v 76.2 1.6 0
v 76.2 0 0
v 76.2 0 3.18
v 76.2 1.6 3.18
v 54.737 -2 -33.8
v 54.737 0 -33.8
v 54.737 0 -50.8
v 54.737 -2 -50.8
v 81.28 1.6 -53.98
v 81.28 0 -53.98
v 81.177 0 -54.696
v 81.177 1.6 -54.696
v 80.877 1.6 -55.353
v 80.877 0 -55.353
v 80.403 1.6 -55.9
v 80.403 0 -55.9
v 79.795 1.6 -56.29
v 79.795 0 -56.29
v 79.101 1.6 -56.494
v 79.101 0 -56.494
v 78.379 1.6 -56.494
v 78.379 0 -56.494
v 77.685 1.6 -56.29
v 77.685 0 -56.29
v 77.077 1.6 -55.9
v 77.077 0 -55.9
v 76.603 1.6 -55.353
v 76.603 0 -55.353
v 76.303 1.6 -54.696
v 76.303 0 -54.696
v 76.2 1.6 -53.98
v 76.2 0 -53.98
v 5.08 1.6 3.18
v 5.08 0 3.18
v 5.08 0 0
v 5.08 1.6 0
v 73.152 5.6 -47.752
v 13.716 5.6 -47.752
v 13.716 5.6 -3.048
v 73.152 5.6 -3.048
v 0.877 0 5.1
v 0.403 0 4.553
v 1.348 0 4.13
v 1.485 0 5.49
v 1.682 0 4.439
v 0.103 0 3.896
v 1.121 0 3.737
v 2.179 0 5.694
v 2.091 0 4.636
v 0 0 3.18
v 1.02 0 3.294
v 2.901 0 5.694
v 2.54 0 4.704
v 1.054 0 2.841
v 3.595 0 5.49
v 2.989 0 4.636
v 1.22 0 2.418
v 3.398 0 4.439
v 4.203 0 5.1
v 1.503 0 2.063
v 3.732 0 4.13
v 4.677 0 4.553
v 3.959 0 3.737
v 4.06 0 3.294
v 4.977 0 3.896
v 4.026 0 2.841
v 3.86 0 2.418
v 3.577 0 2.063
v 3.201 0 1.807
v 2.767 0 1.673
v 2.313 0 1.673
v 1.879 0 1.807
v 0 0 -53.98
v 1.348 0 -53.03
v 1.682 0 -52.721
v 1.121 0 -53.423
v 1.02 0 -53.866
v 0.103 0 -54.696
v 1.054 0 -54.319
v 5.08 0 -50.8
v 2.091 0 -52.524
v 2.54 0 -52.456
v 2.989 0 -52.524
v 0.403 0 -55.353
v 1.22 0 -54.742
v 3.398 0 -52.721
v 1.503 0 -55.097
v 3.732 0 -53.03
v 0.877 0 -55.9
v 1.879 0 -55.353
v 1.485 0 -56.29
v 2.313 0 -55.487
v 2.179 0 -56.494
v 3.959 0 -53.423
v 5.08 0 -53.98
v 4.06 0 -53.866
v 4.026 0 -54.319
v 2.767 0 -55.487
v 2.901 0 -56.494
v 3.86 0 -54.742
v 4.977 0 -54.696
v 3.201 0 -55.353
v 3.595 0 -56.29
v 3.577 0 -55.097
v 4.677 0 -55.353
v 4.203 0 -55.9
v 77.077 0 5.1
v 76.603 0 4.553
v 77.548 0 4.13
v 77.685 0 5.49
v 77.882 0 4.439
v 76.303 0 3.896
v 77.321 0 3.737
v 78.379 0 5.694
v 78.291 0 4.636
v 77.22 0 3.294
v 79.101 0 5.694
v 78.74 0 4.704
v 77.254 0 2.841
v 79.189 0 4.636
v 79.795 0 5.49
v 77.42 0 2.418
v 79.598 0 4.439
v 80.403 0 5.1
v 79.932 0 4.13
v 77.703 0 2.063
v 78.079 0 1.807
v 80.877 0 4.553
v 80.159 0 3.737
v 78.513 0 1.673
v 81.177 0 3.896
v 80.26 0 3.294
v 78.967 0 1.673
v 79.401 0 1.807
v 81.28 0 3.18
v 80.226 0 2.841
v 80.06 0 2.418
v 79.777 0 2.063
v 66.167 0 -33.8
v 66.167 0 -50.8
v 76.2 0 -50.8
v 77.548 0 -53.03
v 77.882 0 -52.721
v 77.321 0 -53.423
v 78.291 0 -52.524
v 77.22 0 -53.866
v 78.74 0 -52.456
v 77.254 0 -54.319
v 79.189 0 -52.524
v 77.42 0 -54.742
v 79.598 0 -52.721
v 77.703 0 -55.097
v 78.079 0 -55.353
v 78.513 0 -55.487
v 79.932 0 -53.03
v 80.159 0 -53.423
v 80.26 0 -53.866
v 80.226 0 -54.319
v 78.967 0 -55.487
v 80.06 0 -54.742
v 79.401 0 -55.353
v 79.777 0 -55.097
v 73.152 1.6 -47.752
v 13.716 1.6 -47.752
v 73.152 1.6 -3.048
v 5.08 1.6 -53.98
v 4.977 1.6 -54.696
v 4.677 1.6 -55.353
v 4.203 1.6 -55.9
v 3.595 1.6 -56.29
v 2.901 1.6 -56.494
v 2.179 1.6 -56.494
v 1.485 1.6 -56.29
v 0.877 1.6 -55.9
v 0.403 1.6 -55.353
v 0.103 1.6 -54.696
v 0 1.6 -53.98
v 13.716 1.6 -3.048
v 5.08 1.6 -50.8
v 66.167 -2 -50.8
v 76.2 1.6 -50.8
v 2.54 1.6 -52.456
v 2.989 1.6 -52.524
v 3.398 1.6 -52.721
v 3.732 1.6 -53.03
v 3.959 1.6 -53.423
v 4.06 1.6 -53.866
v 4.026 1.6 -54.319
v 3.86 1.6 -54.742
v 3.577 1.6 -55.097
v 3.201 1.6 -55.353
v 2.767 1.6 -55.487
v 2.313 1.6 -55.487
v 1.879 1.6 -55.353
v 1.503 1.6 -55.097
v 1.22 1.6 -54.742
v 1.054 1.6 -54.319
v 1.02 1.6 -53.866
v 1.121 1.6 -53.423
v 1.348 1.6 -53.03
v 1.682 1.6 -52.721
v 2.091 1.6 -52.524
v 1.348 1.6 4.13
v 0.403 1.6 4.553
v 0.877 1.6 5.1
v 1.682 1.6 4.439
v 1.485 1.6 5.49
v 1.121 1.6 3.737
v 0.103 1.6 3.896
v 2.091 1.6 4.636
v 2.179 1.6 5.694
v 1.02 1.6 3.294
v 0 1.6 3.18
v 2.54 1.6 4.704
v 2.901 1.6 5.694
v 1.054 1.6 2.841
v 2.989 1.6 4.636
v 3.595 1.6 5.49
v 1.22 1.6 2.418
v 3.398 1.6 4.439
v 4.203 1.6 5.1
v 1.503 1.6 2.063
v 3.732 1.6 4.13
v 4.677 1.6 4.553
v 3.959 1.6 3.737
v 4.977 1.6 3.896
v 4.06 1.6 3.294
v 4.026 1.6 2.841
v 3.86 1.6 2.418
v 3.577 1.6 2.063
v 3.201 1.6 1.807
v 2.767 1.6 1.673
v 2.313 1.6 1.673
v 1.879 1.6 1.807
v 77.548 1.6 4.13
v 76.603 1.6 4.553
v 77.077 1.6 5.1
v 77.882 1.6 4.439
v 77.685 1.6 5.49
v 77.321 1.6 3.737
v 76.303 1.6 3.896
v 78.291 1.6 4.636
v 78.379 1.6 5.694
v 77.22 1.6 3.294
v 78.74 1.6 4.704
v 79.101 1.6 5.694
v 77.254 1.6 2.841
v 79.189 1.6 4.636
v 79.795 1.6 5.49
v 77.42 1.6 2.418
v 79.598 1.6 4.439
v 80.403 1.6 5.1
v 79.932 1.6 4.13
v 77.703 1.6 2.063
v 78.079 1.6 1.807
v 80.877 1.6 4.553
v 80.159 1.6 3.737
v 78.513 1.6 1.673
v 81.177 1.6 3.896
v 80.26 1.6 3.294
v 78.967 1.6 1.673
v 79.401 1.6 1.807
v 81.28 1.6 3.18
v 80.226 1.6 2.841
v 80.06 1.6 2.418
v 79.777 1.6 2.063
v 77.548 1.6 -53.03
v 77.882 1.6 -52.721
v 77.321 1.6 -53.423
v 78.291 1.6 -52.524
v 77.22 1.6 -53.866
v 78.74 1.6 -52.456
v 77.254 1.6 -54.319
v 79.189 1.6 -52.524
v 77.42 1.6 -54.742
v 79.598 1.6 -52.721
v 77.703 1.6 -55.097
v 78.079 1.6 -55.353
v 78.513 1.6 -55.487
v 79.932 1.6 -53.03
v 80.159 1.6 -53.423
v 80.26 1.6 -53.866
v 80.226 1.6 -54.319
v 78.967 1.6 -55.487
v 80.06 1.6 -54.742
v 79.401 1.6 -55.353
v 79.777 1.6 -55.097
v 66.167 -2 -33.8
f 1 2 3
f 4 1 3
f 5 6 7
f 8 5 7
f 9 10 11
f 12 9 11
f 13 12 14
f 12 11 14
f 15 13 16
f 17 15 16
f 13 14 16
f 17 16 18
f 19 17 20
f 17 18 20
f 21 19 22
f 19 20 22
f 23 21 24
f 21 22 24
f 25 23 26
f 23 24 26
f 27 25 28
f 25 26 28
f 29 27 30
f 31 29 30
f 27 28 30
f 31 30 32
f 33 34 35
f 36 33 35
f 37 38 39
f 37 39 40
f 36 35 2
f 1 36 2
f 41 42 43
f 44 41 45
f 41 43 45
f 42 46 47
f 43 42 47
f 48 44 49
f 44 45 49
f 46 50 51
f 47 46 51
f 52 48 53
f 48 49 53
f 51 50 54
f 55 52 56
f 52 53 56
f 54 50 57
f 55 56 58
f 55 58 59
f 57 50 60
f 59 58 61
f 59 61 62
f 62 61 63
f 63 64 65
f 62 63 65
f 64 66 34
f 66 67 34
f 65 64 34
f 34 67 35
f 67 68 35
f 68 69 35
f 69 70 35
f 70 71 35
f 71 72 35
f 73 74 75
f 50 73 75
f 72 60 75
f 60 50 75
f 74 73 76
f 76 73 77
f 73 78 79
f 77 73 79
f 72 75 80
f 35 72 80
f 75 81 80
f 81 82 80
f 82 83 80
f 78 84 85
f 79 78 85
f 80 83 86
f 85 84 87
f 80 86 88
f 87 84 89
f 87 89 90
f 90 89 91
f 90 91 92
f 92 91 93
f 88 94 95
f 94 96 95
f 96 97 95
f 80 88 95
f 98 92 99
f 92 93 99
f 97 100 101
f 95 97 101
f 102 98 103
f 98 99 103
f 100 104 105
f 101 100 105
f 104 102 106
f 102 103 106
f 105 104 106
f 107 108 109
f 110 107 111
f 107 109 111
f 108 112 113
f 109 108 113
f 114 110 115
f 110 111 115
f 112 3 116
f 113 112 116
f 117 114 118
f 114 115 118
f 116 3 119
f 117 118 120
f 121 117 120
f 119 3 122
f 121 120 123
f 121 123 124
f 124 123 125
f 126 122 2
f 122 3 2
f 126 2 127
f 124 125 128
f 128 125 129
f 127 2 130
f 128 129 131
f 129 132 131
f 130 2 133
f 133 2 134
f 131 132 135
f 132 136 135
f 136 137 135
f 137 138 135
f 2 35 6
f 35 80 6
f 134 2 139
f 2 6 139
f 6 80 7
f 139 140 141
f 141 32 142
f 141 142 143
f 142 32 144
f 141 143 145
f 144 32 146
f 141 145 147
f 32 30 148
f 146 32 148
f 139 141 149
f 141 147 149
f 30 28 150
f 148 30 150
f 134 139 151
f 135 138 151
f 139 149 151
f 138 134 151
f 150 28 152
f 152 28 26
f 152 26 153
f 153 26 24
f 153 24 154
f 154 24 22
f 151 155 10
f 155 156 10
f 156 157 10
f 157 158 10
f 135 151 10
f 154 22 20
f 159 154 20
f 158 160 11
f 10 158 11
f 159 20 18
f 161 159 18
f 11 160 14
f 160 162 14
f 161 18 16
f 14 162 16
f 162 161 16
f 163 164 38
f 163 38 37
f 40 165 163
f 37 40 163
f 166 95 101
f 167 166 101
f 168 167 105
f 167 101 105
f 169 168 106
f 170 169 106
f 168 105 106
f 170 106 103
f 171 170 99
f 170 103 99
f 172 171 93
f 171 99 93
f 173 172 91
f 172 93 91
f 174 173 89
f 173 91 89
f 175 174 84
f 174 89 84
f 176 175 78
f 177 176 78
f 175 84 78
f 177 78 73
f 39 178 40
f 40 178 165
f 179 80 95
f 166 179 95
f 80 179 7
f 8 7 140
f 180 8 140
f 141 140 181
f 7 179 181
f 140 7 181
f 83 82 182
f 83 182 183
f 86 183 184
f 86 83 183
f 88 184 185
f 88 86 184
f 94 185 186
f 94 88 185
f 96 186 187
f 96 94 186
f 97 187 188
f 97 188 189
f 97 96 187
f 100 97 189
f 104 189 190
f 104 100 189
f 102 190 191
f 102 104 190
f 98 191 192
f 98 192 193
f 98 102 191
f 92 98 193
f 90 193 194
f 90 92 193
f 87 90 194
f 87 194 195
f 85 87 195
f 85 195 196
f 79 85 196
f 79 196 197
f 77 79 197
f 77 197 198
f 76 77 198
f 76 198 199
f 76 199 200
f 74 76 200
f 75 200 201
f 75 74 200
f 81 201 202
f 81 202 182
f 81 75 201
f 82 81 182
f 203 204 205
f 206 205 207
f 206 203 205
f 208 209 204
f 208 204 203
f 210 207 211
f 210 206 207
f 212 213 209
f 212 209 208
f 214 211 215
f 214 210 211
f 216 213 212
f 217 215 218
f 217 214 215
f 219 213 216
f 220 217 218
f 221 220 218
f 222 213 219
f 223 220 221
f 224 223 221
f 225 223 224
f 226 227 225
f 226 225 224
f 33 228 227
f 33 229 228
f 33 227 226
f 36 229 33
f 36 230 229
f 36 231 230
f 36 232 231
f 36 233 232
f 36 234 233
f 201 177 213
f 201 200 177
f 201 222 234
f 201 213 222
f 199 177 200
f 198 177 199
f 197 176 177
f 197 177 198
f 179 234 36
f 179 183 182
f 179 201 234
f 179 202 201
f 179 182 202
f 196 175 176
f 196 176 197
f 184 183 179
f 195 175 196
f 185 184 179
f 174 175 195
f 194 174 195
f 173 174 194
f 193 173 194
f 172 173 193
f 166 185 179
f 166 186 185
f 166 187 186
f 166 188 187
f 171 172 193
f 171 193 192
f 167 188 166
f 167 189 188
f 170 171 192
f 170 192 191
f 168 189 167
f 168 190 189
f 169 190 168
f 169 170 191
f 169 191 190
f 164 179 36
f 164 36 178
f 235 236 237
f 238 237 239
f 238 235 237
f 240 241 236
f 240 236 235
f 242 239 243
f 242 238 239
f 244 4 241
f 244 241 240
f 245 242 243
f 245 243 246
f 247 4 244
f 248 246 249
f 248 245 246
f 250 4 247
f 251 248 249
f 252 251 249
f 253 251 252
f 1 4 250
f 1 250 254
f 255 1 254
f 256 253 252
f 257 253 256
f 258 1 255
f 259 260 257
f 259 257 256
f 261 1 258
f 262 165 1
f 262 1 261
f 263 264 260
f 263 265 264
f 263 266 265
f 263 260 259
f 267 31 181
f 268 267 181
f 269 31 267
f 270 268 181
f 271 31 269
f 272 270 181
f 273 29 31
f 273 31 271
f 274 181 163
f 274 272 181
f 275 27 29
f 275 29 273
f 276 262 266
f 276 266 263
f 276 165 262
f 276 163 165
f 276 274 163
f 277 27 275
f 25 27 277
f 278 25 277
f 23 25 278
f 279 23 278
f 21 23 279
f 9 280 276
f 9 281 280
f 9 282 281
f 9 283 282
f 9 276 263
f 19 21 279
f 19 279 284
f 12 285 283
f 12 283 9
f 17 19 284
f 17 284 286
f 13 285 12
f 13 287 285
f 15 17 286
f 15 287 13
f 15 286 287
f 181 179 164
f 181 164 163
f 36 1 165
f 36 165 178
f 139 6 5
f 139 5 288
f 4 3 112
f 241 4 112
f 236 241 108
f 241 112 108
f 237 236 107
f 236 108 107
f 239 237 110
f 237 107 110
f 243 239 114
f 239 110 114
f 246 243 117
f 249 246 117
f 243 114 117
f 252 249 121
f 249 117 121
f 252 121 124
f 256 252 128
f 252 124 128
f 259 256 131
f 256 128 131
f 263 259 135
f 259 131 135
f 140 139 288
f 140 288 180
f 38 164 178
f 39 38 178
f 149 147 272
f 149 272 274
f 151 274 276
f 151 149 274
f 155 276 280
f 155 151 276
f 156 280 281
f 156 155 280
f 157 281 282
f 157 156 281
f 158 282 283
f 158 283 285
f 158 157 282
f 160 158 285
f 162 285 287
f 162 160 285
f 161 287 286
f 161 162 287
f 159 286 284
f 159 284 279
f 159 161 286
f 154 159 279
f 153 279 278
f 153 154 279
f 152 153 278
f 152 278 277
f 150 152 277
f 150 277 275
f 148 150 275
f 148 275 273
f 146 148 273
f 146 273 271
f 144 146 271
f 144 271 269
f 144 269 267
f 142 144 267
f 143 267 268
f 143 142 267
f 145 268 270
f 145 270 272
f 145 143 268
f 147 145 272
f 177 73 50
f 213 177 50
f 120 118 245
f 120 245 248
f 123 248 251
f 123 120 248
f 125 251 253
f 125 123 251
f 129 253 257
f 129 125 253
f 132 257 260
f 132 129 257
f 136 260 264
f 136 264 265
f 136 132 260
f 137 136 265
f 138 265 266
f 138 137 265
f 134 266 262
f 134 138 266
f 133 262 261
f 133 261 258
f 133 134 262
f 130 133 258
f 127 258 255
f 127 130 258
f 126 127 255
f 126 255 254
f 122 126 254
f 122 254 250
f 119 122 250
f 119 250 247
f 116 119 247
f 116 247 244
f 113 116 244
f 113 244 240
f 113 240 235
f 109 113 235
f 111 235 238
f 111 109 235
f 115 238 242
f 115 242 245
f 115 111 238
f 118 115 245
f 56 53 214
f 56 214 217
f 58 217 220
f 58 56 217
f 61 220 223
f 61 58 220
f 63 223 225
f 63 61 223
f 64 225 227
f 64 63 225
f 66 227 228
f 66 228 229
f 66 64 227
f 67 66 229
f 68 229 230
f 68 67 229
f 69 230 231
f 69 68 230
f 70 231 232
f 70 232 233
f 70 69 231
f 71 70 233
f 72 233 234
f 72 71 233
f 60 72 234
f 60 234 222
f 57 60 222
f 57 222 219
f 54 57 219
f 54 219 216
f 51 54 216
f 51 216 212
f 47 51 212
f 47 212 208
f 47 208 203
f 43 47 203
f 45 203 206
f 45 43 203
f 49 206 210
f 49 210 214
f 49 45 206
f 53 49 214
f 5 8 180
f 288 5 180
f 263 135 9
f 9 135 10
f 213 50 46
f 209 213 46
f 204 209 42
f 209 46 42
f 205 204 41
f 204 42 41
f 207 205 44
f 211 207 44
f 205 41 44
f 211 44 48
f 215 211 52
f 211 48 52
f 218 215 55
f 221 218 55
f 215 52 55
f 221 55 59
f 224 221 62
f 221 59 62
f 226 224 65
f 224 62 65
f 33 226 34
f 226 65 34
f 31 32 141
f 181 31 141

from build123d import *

# Parameters (mm, degrees)
Y_PCB_EXTR_DEPTH                = 1.6
SKETCH1_5_R                     = 1.524
Z0X0_CORNER_EXTR_DEPTH          = 1.6
SKETCH1_6_R                     = 1.524
Z0X_CORNER_EXTR_DEPTH           = 1.6
SKETCH1_7_R                     = 1.524
Z_X0_CORNER_EXTR_DEPTH          = 1.6
SKETCH1_8_R                     = 1.524
Z_X_CORNER_EXTR_DEPTH           = 1.6
Y_DISPLAY_EXTR_DEPTH            = 5.6
SKETCH1_11_W                    = 11.43
SKETCH1_11_H                    = 13.952
Y_DISPLAY_EXTR_BEHIND_USD_DEPTH = 5.6
SKETCH1_12_W                    = 11.43
SKETCH1_12_H                    = 3.048
Y_USD_EXTR_OUTER_EDGE_DEPTH     = 1.6
SKETCH1_13_W                    = 11.43
SKETCH1_13_H                    = 13.952
Y_USD_EXTR_DEPTH                = 2
SKETCH1_14_W                    = 11.43
SKETCH1_14_H                    = 3.048
Y_USD_EXTR_OUTER_BOTTOM_DEPTH   = 2


with BuildPart() as part:
    # Sketch1 → Y+ PCB extr (new body)
    with BuildSketch(Plane(origin=(0, 0, 0), x_dir=(1, 0, 0), z_dir=(0, 1, 0))):
        Polygon((81.28, 50.8), (76.2, 50.8), (66.167, 50.8), (66.167, 47.752), (73.152, 47.752), (73.152, 3.048), (13.716, 3.048), (13.716, 47.752), (54.737, 47.752), (54.737, 50.8), (5.08, 50.8), (0, 50.8), (0, 0), (5.08, 0), (76.2, 0), (81.28, 0), align=None)
    extrude(amount=Y_PCB_EXTR_DEPTH)

    # Sketch1<5> → Z0X0 corner extr (add)
    with BuildSketch(Plane(origin=(0, 0, 0), x_dir=(1, 0, 0), z_dir=(0, 1, 0))):
        with BuildLine():
            Line((0, 50.8), (5.08, 50.8))
            Line((5.08, 50.8), (5.08, 53.98))
            ThreePointArc((5.08, 53.98), (2.54, 56.52), (0, 53.98))
            Line((0, 53.98), (0, 50.8))
        make_face()
        with Locations((2.54, 53.98)):
            Circle(SKETCH1_5_R, mode=Mode.SUBTRACT)
    extrude(amount=Z0X0_CORNER_EXTR_DEPTH)

    # Sketch1<6> → Z0X+ corner extr (add)
    with BuildSketch(Plane(origin=(0, 0, 0), x_dir=(1, 0, 0), z_dir=(0, 1, 0))):
        with BuildLine():
            Line((76.2, 53.98), (76.2, 50.8))
            Line((76.2, 50.8), (81.28, 50.8))
            Line((81.28, 50.8), (81.28, 53.98))
            ThreePointArc((81.28, 53.98), (78.74, 56.52), (76.2, 53.98))
        make_face()
        with Locations((78.74, 53.98)):
            Circle(SKETCH1_6_R, mode=Mode.SUBTRACT)
    extrude(amount=Z0X_CORNER_EXTR_DEPTH)

    # Sketch1<7> → Z+X0 corner extr (add)
    with BuildSketch(Plane(origin=(0, 0, 0), x_dir=(1, 0, 0), z_dir=(0, 1, 0))):
        with BuildLine():
            Line((5.08, -3.18), (5.08, 0))
            Line((5.08, 0), (0, 0))
            Line((0, 0), (0, -3.18))
            ThreePointArc((0, -3.18), (2.54, -5.72), (5.08, -3.18))
        make_face()
        with Locations((2.54, -3.18)):
            Circle(SKETCH1_7_R, mode=Mode.SUBTRACT)
    extrude(amount=Z_X0_CORNER_EXTR_DEPTH)

    # Sketch1<8> → Z+X+ corner extr (add)
    with BuildSketch(Plane(origin=(0, 0, 0), x_dir=(1, 0, 0), z_dir=(0, 1, 0))):
        with BuildLine():
            Line((81.28, -3.18), (81.28, 0))
            Line((81.28, 0), (76.2, 0))
            Line((76.2, 0), (76.2, -3.18))
            ThreePointArc((76.2, -3.18), (78.74, -5.72), (81.28, -3.18))
        make_face()
        with Locations((78.74, -3.18)):
            Circle(SKETCH1_8_R, mode=Mode.SUBTRACT)
    extrude(amount=Z_X_CORNER_EXTR_DEPTH)

    # Sketch1<10> → Y+ display extr (add)
    with BuildSketch(Plane(origin=(0, 0, 0), x_dir=(1, 0, 0), z_dir=(0, 1, 0))):
        Polygon((73.152, 47.752), (66.167, 47.752), (66.167, 33.8), (54.737, 33.8), (54.737, 47.752), (13.716, 47.752), (13.716, 3.048), (73.152, 3.048), align=None)
    extrude(amount=Y_DISPLAY_EXTR_DEPTH)

    # Sketch1<11> → Y+ display extr behind uSD (add)
    with BuildSketch(Plane(origin=(0, 0, 0), x_dir=(1, 0, 0), z_dir=(0, 1, 0))):
        with Locations((60.452, 40.776)):
            Rectangle(SKETCH1_11_W, SKETCH1_11_H)
    extrude(amount=Y_DISPLAY_EXTR_BEHIND_USD_DEPTH)

    # Sketch1<12> → Y- uSD extr outer edge (add)
    with BuildSketch(Plane(origin=(0, 0, 0), x_dir=(1, 0, 0), z_dir=(0, 1, 0))):
        with Locations((60.452, 49.276)):
            Rectangle(SKETCH1_12_W, SKETCH1_12_H)
    extrude(amount=Y_USD_EXTR_OUTER_EDGE_DEPTH)

    # Sketch1<13> → Y- uSD extr (add)
    with BuildSketch(Plane(origin=(0, 0, 0), x_dir=(1, 0, 0), z_dir=(0, 1, 0))):
        with Locations((60.452, 40.776)):
            Rectangle(SKETCH1_13_W, SKETCH1_13_H)
    extrude(amount=-Y_USD_EXTR_DEPTH)

    # Sketch1<14> → Y- uSD extr outer bottom (add)
    with BuildSketch(Plane(origin=(0, 0, 0), x_dir=(1, 0, 0), z_dir=(0, 1, 0))):
        with Locations((60.452, 49.276)):
            Rectangle(SKETCH1_14_W, SKETCH1_14_H)
    extrude(amount=-Y_USD_EXTR_OUTER_BOTTOM_DEPTH)


solid = part.part
